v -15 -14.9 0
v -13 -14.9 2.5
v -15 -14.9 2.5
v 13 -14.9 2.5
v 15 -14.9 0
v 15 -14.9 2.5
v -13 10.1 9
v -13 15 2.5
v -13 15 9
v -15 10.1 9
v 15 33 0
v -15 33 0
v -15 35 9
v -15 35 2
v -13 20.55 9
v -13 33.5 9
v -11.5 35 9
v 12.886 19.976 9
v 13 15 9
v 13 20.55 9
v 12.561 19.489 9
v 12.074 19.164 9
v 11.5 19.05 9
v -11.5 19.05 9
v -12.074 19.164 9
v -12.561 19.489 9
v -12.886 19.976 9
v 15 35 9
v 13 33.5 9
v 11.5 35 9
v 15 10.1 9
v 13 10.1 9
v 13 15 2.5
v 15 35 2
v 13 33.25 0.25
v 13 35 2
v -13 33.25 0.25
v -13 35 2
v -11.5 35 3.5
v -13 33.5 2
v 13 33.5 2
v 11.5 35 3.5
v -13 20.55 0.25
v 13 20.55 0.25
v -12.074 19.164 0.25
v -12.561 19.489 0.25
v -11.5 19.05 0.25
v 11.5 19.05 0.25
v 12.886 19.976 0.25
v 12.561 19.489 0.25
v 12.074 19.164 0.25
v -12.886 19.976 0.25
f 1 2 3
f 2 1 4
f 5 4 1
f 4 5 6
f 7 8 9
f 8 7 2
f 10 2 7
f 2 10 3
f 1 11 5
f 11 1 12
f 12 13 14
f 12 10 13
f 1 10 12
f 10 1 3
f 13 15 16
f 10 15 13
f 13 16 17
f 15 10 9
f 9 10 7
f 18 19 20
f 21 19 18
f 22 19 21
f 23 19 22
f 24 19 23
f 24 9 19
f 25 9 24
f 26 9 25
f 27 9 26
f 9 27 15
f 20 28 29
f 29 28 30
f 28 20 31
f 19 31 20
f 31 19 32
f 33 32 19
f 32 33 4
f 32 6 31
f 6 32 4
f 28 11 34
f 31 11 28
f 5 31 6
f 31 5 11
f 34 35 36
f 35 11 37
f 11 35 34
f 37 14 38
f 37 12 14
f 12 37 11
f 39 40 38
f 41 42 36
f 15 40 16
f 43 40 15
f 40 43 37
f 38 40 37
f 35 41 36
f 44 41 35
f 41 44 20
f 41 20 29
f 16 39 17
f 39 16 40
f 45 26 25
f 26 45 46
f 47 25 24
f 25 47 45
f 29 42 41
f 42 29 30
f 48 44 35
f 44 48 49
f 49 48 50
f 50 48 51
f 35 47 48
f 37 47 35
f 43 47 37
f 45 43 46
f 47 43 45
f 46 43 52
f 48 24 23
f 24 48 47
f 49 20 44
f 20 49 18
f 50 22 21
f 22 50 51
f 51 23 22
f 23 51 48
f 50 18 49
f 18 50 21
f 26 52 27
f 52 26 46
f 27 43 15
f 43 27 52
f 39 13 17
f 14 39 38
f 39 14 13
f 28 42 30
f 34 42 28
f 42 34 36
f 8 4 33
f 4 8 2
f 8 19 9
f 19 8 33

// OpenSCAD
// file: parameters.scad
/*
OpenFlexure Dissection Microscope: Parameters

These variables set the geometry of the microscope.
*/

// Geometry of the mounting post
front_dovetail_y = 35; // position of the main dovetail
front_dovetail_w = 30; // width of the main dovetail
post_h = 75; // height of the post (working distance + clip_h)
mounting_holes = [[25,0,0],[-25,0,0],[0,25,0]]; // location of mounting bolts

// Geometry of the camera mount

// Illumination
illumination_arm_l = 35.6;
// NB illumination arm places the LED 35.6mm from the mounting hole.

d = 0.05;
// main file
/******************************************************************
*                                                                 *
* OpenFlexure Dissection Microscope: Microscope body              *
*                                                                 *
* This is the chassis of the OpenFlexure microscope, an open      *
* microscope and 3-axis translation stage.  It gets really good   *
* precision over a ~10mm range, by using plastic flexure          *
* mechanisms.                                                     *
*                                                                 *
* (c) Richard Bowman, January 2016                                *
* Released under the CERN Open Hardware License                   *
*                                                                 *
******************************************************************/

use <./utilities.scad>;
use <./dovetail.scad>;
use <./cameras/picamera_2.scad>;
include <./parameters.scad>;

camera_pcb = [25, 25];
wall_t = 2;
w = camera_pcb[0] + 1 + 4;
starty = -camera_pcb[1]/2-2.4; //edge of the PCB
base_h = 2.5; //thickness of the camera mount plate (lens pokes through this)
dt_clip = [front_dovetail_w, 16, 9]; //size of the dovetail clip
arm_end_y = front_dovetail_y-dt_clip[1]-4;

// parameters of the LED
led_r = 5/2;
led_h = 4;
$fn=32;

difference(){
    union(){
        // plate that the camera sits on
        translate([-w/2, starty,0]) cube([w,camera_pcb[1]+5,base_h]);
        
        // walls either side for stiffness
        reflect([1,0,0]) sequential_hull(){
            translate([-w/2, starty,0]) cube([wall_t, wall_t, base_h]);
            translate([-w/2, starty + camera_pcb[1],0]) cube([wall_t, wall_t, min(dt_clip[2], base_h+8)]);
            translate([-dt_clip[0]/2, arm_end_y,0]) cube([wall_t, wall_t, dt_clip[2]]);
        }
        
        // add a bottom
        hull() reflect([1,0,0]){
            translate([-w/2, starty + camera_pcb[1],0]) cube([wall_t, wall_t, base_h]);
            translate([-dt_clip[0]/2, arm_end_y,0]) cube([wall_t, wall_t, base_h]);
        }
        
        // mount for the dovetail clip
        translate([-dt_clip[0]/2,arm_end_y,0]) cube([dt_clip[0], 4, dt_clip[2]]);
        
        // the dovetail clip
        translate([0,front_dovetail_y, 0]) mirror([0,1,0]) dovetail_clip(dt_clip, slope_front=2, solid_bottom=0.2);
        
    }
    
}
